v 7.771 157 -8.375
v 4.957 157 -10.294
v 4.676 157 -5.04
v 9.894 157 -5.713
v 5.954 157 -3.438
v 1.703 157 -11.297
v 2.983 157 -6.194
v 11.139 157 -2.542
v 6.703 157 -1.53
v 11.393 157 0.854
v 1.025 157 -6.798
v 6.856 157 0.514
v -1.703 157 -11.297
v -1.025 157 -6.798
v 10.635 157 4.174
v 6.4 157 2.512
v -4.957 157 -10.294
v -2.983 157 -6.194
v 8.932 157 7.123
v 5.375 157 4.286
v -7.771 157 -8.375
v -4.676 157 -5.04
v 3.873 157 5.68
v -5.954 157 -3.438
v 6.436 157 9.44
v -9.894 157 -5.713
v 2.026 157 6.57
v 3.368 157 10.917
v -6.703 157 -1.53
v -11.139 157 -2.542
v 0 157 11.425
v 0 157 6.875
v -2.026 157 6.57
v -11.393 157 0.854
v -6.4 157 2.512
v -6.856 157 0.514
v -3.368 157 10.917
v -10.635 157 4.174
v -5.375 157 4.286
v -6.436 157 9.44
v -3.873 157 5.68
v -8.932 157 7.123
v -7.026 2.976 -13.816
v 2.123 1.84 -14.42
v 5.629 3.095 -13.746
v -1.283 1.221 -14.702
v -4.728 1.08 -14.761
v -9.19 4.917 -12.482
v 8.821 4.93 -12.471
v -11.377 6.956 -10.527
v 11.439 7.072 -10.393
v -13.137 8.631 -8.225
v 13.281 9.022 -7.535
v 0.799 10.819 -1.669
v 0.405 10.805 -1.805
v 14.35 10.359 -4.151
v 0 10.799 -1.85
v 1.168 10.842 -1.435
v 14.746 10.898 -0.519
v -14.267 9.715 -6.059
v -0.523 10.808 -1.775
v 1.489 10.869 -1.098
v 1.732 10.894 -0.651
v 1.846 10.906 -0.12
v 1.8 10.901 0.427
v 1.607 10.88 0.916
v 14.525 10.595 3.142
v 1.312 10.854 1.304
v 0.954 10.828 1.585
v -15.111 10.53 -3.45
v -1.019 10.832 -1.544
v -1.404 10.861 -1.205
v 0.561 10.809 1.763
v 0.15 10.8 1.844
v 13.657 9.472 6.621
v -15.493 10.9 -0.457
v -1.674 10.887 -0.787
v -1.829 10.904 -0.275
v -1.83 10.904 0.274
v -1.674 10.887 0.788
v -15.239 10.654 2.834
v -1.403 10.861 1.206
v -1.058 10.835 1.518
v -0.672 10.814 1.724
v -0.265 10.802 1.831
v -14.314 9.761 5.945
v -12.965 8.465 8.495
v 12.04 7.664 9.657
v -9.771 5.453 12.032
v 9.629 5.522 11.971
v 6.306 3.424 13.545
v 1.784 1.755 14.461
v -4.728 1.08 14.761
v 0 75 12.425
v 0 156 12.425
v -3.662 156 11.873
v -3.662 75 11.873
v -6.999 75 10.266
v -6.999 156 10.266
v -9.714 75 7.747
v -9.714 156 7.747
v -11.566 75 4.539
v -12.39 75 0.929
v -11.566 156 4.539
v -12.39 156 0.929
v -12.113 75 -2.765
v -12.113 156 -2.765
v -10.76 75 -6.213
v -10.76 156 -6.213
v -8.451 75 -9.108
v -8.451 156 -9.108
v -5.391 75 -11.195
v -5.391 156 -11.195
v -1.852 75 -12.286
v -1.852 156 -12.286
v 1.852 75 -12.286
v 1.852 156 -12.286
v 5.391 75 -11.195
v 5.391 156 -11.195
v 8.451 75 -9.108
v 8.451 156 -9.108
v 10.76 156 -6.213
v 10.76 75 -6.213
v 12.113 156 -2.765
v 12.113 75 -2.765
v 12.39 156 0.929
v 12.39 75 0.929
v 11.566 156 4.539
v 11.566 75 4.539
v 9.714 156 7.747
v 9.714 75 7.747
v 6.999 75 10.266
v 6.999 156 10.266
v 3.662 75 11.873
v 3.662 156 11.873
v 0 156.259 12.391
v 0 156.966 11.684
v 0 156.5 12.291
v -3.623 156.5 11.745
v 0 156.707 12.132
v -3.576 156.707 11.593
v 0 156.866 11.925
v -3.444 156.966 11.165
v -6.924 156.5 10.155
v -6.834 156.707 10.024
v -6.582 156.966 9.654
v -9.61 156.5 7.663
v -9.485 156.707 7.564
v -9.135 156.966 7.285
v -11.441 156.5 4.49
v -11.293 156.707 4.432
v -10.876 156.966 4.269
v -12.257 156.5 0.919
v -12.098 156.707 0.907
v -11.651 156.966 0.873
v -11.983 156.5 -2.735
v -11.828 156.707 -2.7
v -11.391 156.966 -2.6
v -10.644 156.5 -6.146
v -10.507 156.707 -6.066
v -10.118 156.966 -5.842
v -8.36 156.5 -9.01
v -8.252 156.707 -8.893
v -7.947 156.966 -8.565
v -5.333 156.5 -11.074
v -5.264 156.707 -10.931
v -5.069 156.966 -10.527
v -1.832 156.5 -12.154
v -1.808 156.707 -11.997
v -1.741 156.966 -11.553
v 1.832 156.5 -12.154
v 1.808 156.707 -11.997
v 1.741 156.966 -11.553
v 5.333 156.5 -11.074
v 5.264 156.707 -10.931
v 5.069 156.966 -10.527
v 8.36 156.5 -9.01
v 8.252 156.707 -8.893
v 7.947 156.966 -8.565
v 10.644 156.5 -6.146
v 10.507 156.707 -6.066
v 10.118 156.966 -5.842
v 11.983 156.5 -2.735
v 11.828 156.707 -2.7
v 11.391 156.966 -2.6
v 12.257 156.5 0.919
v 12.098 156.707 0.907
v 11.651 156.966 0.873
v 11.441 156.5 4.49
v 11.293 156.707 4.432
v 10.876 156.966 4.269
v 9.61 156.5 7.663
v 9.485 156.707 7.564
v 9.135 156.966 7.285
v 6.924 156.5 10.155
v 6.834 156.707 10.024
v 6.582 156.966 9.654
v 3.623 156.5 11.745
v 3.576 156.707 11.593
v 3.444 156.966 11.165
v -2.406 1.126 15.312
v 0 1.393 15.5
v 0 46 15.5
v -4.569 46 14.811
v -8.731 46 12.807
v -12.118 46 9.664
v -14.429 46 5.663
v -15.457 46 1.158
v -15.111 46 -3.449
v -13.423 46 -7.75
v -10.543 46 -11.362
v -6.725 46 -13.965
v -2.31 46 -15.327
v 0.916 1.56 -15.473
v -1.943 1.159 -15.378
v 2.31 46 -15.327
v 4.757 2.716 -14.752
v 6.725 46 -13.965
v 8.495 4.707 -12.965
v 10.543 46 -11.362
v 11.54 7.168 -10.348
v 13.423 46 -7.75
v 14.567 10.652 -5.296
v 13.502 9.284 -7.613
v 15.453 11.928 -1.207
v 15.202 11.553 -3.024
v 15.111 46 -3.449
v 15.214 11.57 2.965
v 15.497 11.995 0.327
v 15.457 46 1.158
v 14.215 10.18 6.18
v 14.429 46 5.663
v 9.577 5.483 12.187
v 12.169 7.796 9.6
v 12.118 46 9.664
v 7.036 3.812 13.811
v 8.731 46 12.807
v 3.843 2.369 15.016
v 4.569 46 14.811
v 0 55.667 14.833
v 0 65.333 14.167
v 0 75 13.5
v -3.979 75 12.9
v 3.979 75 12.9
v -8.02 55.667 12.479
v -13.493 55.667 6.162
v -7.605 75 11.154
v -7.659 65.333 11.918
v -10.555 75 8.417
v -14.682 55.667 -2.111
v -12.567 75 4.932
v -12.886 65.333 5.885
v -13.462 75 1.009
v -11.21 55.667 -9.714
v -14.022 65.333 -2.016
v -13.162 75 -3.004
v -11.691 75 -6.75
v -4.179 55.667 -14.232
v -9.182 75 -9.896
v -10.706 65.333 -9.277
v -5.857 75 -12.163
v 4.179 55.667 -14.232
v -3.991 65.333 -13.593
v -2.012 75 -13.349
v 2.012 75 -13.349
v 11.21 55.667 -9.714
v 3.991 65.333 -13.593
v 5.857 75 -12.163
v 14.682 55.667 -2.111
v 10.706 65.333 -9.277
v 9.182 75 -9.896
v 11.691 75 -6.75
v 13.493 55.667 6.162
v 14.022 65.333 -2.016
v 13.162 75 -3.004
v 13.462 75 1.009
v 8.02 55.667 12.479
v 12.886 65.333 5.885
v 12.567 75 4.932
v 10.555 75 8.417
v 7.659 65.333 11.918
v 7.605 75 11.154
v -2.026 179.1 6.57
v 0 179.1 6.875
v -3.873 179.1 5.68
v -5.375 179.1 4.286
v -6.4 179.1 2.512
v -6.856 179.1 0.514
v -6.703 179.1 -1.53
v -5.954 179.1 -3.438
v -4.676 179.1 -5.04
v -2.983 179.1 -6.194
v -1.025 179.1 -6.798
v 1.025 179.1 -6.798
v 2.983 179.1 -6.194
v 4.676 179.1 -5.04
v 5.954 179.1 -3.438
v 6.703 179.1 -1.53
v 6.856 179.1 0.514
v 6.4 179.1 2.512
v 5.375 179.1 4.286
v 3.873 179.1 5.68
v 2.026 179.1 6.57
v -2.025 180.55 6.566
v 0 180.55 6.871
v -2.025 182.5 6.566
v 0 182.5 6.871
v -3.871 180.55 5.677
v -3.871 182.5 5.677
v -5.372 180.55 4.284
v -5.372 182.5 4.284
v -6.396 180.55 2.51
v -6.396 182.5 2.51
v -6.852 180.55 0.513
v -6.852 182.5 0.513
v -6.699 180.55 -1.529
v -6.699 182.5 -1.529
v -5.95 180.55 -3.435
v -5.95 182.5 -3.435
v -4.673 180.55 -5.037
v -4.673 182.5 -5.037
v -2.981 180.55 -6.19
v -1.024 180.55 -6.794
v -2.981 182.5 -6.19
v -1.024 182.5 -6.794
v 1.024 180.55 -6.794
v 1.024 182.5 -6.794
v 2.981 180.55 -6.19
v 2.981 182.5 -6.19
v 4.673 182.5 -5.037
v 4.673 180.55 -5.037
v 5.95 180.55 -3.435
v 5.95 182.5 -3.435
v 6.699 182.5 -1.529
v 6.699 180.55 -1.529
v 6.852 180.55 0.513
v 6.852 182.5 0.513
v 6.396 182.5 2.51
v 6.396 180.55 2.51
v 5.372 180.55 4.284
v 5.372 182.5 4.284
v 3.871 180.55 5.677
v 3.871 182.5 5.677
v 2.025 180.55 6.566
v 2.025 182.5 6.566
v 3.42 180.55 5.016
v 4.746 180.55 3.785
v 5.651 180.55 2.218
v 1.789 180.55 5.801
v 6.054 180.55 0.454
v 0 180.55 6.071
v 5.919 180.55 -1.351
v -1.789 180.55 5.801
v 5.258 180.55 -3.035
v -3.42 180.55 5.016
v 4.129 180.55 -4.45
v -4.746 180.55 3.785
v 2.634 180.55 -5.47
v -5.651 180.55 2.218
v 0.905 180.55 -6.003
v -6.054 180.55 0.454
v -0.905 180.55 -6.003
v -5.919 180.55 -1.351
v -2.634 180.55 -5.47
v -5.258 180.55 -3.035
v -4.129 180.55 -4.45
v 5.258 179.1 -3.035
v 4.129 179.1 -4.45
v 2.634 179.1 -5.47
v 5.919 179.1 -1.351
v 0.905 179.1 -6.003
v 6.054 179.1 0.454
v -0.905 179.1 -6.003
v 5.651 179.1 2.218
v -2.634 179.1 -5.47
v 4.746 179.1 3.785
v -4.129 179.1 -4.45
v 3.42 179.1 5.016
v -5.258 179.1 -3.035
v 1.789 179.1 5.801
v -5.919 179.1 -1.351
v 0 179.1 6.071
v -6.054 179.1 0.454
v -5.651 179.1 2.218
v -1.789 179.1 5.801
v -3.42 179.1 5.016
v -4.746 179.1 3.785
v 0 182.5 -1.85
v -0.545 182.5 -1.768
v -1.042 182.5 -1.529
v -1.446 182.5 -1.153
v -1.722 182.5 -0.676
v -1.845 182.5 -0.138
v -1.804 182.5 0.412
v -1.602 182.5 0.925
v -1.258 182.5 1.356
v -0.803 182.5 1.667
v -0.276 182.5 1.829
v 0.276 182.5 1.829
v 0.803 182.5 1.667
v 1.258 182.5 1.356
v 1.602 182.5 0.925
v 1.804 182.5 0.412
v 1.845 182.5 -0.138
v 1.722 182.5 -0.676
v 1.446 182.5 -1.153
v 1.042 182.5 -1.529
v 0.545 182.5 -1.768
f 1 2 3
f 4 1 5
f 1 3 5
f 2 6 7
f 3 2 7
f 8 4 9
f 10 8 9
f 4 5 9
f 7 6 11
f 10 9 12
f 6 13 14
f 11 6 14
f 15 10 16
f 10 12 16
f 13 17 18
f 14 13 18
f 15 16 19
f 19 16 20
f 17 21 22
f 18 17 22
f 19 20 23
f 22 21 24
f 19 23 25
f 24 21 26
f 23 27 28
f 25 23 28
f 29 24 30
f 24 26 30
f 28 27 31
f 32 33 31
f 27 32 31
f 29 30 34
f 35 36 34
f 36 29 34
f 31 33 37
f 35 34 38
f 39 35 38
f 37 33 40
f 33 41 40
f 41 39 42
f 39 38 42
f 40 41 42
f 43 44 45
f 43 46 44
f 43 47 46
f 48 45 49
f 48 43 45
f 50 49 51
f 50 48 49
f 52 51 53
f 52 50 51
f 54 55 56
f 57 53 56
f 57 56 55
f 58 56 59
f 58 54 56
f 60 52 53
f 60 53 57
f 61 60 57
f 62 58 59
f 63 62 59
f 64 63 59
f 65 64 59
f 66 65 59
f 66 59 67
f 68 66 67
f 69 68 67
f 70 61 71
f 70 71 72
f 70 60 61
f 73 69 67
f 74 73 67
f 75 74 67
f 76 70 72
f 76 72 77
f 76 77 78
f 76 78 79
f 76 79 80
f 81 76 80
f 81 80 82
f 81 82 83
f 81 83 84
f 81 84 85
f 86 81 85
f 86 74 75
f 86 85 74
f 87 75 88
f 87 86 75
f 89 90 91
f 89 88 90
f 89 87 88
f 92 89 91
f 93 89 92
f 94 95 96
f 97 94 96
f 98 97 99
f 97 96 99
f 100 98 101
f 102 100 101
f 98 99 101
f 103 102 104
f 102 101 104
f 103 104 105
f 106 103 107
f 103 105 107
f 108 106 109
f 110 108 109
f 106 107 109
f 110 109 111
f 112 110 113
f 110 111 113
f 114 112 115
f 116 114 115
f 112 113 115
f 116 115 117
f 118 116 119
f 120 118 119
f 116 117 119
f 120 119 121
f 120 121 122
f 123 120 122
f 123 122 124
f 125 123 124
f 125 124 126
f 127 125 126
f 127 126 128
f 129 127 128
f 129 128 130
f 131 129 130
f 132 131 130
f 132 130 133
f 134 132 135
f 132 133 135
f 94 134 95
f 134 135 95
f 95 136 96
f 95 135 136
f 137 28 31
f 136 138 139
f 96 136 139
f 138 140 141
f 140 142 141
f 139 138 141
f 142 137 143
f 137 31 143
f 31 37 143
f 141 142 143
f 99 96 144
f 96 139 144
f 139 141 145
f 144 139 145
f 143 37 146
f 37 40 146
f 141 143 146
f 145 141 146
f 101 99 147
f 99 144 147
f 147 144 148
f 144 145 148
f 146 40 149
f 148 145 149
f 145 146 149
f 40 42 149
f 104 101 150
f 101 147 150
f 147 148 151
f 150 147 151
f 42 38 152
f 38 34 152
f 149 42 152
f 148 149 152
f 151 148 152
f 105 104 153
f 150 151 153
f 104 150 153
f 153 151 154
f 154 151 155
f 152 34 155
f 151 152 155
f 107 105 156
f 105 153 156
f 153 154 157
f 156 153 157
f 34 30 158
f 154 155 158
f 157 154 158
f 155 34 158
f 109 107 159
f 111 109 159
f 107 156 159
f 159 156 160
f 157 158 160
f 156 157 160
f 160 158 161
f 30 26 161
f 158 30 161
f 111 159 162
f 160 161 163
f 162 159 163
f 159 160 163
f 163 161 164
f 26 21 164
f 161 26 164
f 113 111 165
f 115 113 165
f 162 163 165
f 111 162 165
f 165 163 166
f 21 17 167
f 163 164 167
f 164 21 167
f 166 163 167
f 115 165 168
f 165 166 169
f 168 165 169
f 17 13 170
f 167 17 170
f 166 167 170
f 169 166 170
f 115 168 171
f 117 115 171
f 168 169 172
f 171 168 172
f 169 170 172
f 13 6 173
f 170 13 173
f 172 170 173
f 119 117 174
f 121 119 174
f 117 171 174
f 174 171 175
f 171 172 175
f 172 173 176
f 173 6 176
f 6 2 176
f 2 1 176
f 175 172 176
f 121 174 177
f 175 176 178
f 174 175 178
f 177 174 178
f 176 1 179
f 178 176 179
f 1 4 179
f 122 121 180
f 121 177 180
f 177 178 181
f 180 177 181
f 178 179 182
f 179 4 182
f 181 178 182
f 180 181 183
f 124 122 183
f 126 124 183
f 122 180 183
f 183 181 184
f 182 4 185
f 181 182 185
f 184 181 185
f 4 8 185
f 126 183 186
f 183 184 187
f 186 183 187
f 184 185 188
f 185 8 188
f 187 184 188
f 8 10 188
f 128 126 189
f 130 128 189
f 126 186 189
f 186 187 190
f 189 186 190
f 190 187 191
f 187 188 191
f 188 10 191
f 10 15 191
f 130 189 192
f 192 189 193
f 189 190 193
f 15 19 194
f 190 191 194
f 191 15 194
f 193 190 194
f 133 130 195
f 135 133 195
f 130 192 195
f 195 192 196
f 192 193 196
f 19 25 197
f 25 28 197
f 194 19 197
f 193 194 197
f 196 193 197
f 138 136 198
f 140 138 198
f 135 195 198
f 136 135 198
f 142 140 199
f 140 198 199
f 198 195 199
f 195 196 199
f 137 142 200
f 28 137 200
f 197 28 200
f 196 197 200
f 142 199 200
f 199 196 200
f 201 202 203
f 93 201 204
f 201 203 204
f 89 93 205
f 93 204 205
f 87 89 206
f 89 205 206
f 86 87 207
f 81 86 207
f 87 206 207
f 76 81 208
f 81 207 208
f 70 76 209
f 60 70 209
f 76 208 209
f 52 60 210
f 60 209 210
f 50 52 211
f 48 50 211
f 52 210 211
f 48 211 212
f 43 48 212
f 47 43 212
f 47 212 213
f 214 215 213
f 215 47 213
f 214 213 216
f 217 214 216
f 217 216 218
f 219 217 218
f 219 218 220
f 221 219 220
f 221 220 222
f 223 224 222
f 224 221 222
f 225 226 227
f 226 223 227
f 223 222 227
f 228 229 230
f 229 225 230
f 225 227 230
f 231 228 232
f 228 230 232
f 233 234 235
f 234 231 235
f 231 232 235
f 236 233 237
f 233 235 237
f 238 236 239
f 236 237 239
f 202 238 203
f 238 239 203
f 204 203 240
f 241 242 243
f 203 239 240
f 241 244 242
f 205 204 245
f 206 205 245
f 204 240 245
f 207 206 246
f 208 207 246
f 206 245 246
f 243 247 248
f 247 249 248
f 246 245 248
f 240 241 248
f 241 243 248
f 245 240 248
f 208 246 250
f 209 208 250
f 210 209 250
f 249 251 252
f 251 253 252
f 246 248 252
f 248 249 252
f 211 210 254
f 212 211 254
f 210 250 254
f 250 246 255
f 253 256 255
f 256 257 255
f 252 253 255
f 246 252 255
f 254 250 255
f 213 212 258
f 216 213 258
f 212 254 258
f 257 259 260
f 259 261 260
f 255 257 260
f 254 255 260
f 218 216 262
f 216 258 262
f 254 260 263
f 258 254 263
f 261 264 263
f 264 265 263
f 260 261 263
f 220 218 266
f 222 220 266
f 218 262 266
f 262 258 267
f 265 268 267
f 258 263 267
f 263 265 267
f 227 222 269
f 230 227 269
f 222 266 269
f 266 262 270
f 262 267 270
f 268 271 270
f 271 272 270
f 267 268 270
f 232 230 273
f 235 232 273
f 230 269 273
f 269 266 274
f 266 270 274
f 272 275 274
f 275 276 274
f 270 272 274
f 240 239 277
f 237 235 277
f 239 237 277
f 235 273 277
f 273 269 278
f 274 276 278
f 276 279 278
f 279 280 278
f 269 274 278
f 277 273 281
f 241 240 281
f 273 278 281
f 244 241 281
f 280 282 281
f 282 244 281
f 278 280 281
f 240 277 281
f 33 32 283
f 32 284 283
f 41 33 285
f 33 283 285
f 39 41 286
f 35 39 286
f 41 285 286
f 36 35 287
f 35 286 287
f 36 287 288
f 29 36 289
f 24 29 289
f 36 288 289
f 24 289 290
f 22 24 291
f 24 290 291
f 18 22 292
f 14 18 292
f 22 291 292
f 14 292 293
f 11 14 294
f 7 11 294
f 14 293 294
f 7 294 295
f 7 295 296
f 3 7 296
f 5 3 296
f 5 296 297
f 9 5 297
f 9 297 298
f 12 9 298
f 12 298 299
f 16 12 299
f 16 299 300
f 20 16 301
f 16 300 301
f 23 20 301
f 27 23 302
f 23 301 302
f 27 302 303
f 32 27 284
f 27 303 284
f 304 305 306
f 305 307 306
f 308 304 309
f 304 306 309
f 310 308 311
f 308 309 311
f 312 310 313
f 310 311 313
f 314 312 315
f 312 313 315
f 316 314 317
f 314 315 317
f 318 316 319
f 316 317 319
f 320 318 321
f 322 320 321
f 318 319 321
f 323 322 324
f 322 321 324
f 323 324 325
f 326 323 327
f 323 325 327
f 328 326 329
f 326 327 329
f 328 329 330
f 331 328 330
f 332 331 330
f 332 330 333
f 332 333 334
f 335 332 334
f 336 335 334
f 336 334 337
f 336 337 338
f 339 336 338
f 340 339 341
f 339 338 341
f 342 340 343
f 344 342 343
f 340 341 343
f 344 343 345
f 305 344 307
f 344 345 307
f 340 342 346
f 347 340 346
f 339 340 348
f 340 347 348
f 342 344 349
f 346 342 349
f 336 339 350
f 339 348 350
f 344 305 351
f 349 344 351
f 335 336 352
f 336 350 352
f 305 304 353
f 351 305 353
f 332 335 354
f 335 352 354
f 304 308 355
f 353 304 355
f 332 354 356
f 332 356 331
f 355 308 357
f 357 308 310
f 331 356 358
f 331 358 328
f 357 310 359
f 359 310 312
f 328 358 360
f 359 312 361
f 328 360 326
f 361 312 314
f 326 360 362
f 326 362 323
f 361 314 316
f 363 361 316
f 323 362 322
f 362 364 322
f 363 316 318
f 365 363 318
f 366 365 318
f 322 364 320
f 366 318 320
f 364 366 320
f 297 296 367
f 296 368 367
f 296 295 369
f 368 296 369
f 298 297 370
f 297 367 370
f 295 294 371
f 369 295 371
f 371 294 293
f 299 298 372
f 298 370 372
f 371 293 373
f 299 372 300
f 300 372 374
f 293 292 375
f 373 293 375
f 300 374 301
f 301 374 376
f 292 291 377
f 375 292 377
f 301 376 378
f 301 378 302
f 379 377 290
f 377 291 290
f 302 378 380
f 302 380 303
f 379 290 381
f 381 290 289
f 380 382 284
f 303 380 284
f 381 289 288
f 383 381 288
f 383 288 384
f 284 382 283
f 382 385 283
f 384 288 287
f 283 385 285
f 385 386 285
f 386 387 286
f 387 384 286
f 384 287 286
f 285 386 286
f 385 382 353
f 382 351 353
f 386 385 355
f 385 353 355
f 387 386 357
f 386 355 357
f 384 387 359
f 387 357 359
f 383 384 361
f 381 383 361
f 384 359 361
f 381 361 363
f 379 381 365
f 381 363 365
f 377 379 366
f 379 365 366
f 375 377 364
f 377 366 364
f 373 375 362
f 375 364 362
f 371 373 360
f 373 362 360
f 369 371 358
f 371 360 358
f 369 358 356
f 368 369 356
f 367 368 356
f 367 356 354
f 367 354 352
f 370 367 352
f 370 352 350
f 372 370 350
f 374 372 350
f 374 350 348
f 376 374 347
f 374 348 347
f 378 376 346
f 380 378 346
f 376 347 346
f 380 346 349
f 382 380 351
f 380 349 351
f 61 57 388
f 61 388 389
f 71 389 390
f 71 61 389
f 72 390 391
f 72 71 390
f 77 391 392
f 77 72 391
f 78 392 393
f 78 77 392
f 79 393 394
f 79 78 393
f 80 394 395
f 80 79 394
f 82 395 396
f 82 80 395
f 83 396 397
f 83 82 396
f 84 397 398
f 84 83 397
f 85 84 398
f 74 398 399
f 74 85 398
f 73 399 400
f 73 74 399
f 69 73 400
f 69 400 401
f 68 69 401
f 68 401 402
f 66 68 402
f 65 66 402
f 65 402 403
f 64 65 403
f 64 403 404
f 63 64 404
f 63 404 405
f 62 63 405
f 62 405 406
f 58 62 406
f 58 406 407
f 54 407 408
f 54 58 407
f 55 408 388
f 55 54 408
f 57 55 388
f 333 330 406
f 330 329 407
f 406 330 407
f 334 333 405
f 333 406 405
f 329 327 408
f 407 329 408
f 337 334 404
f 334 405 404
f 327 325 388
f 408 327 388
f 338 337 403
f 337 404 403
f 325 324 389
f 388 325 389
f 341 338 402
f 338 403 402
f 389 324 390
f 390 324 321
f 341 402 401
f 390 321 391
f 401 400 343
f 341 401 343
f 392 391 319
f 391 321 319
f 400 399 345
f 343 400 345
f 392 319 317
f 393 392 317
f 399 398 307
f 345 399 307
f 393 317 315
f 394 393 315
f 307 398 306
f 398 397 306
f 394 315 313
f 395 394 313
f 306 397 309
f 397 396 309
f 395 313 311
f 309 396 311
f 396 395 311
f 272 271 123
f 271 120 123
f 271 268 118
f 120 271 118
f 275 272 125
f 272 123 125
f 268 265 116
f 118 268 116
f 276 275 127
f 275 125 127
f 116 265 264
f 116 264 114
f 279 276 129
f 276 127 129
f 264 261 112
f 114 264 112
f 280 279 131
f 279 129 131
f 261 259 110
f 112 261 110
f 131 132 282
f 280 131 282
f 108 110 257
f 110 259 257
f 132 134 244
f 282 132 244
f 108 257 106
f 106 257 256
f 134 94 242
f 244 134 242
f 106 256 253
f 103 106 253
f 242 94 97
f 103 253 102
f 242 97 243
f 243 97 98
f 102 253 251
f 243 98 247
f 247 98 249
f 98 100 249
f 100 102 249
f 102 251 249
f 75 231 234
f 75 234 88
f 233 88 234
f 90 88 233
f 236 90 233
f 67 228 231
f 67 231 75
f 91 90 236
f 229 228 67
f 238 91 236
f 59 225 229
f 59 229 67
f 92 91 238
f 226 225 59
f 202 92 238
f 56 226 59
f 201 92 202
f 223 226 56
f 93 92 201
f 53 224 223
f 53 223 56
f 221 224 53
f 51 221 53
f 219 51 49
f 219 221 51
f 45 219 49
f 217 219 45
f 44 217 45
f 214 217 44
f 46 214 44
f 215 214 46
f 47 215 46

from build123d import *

# Parameters (mm, degrees)
FILLET1_R               = 1
CUT_EXTRUDE1_DEPTH      = 184.811724327
CUT_EXTRUDE1_DEPTH_BACK = 184.811724327
CUT_EXTRUDE2_DEPTH      = 183.746332302
CUT_EXTRUDE2_DEPTH_BACK = 180
SKETCH3_R               = 1.85
CUT_EXTRUDE3_DEPTH      = 184.811724344
CUT_EXTRUDE3_DEPTH_BACK = 184.811724344
SKETCH4_R               = 16


with BuildPart() as part:
    # Sketch1 → Revolve2 (revolve)
    with BuildSketch(Plane.XY):
        Polygon((0, 0), (15.5, 0), (15.5, 46), (13.5, 75), (12.425, 75), (12.425, 157), (6.875, 157), (6.875, 179.1), (6.070935316, 179.1), (6.070935316, 180.55), (6.870935316, 180.55), (6.870935316, 182.5), (0, 182.5), align=None)
    revolve(axis=Axis((0, 263.878189578, 0), (0, -1, 0)))

    # Fillet1
    fillet1_edges = [part.edges().sort_by_distance(p)[0] for p in [
        (-12.425, 157, 0),
    ]]
    fillet(fillet1_edges, radius=FILLET1_R)

    # Sketch2 → Cut-Extrude1 (cut, two sides: drawn at the far end of the back side and taken through both)
    with BuildSketch(Plane.XY.offset(-CUT_EXTRUDE1_DEPTH_BACK)):
        with BuildLine():
            Line((-15.5, 3), (-19.676433944, 0))
            Line((-19.676433944, 0), (9.520360954, -11.635719705))
            Line((9.520360954, -11.635719705), (20.15271979, -0.609569802))
            Line((20.15271979, -0.609569802), (15.5, 12))
            add(Edge.make_bspline(
                [(15.5, 12), (5.345045333, -3.515489974), (-15.5, 3)],
                knots=[0, 0, 0, 1, 1, 1], degree=2))
        make_face()
    extrude(amount=CUT_EXTRUDE1_DEPTH + CUT_EXTRUDE1_DEPTH_BACK, mode=Mode.SUBTRACT)

    # Sketch3 → Cut-Extrude2 (cut, two sides: drawn at the far end of the back side and taken through both)
    with BuildSketch(Plane(origin=(0, 182.5, 0), x_dir=(1, 0, 0), z_dir=(0, 1, 0)).offset(-CUT_EXTRUDE2_DEPTH_BACK)):
        Circle(SKETCH3_R)
    extrude(amount=CUT_EXTRUDE2_DEPTH + CUT_EXTRUDE2_DEPTH_BACK, mode=Mode.SUBTRACT)

    # Sketch4 → Cut-Extrude3 (cut, two sides: drawn at the far end of the back side and taken through both)
    with BuildSketch(Plane(origin=(0, 0, 0), x_dir=(0, 0, -1), z_dir=(1, 0, 0)).offset(-CUT_EXTRUDE3_DEPTH_BACK)):
        with Locations((0, -5.093252724)):
            Circle(SKETCH4_R)
    extrude(amount=CUT_EXTRUDE3_DEPTH + CUT_EXTRUDE3_DEPTH_BACK, mode=Mode.SUBTRACT)


solid = part.part
